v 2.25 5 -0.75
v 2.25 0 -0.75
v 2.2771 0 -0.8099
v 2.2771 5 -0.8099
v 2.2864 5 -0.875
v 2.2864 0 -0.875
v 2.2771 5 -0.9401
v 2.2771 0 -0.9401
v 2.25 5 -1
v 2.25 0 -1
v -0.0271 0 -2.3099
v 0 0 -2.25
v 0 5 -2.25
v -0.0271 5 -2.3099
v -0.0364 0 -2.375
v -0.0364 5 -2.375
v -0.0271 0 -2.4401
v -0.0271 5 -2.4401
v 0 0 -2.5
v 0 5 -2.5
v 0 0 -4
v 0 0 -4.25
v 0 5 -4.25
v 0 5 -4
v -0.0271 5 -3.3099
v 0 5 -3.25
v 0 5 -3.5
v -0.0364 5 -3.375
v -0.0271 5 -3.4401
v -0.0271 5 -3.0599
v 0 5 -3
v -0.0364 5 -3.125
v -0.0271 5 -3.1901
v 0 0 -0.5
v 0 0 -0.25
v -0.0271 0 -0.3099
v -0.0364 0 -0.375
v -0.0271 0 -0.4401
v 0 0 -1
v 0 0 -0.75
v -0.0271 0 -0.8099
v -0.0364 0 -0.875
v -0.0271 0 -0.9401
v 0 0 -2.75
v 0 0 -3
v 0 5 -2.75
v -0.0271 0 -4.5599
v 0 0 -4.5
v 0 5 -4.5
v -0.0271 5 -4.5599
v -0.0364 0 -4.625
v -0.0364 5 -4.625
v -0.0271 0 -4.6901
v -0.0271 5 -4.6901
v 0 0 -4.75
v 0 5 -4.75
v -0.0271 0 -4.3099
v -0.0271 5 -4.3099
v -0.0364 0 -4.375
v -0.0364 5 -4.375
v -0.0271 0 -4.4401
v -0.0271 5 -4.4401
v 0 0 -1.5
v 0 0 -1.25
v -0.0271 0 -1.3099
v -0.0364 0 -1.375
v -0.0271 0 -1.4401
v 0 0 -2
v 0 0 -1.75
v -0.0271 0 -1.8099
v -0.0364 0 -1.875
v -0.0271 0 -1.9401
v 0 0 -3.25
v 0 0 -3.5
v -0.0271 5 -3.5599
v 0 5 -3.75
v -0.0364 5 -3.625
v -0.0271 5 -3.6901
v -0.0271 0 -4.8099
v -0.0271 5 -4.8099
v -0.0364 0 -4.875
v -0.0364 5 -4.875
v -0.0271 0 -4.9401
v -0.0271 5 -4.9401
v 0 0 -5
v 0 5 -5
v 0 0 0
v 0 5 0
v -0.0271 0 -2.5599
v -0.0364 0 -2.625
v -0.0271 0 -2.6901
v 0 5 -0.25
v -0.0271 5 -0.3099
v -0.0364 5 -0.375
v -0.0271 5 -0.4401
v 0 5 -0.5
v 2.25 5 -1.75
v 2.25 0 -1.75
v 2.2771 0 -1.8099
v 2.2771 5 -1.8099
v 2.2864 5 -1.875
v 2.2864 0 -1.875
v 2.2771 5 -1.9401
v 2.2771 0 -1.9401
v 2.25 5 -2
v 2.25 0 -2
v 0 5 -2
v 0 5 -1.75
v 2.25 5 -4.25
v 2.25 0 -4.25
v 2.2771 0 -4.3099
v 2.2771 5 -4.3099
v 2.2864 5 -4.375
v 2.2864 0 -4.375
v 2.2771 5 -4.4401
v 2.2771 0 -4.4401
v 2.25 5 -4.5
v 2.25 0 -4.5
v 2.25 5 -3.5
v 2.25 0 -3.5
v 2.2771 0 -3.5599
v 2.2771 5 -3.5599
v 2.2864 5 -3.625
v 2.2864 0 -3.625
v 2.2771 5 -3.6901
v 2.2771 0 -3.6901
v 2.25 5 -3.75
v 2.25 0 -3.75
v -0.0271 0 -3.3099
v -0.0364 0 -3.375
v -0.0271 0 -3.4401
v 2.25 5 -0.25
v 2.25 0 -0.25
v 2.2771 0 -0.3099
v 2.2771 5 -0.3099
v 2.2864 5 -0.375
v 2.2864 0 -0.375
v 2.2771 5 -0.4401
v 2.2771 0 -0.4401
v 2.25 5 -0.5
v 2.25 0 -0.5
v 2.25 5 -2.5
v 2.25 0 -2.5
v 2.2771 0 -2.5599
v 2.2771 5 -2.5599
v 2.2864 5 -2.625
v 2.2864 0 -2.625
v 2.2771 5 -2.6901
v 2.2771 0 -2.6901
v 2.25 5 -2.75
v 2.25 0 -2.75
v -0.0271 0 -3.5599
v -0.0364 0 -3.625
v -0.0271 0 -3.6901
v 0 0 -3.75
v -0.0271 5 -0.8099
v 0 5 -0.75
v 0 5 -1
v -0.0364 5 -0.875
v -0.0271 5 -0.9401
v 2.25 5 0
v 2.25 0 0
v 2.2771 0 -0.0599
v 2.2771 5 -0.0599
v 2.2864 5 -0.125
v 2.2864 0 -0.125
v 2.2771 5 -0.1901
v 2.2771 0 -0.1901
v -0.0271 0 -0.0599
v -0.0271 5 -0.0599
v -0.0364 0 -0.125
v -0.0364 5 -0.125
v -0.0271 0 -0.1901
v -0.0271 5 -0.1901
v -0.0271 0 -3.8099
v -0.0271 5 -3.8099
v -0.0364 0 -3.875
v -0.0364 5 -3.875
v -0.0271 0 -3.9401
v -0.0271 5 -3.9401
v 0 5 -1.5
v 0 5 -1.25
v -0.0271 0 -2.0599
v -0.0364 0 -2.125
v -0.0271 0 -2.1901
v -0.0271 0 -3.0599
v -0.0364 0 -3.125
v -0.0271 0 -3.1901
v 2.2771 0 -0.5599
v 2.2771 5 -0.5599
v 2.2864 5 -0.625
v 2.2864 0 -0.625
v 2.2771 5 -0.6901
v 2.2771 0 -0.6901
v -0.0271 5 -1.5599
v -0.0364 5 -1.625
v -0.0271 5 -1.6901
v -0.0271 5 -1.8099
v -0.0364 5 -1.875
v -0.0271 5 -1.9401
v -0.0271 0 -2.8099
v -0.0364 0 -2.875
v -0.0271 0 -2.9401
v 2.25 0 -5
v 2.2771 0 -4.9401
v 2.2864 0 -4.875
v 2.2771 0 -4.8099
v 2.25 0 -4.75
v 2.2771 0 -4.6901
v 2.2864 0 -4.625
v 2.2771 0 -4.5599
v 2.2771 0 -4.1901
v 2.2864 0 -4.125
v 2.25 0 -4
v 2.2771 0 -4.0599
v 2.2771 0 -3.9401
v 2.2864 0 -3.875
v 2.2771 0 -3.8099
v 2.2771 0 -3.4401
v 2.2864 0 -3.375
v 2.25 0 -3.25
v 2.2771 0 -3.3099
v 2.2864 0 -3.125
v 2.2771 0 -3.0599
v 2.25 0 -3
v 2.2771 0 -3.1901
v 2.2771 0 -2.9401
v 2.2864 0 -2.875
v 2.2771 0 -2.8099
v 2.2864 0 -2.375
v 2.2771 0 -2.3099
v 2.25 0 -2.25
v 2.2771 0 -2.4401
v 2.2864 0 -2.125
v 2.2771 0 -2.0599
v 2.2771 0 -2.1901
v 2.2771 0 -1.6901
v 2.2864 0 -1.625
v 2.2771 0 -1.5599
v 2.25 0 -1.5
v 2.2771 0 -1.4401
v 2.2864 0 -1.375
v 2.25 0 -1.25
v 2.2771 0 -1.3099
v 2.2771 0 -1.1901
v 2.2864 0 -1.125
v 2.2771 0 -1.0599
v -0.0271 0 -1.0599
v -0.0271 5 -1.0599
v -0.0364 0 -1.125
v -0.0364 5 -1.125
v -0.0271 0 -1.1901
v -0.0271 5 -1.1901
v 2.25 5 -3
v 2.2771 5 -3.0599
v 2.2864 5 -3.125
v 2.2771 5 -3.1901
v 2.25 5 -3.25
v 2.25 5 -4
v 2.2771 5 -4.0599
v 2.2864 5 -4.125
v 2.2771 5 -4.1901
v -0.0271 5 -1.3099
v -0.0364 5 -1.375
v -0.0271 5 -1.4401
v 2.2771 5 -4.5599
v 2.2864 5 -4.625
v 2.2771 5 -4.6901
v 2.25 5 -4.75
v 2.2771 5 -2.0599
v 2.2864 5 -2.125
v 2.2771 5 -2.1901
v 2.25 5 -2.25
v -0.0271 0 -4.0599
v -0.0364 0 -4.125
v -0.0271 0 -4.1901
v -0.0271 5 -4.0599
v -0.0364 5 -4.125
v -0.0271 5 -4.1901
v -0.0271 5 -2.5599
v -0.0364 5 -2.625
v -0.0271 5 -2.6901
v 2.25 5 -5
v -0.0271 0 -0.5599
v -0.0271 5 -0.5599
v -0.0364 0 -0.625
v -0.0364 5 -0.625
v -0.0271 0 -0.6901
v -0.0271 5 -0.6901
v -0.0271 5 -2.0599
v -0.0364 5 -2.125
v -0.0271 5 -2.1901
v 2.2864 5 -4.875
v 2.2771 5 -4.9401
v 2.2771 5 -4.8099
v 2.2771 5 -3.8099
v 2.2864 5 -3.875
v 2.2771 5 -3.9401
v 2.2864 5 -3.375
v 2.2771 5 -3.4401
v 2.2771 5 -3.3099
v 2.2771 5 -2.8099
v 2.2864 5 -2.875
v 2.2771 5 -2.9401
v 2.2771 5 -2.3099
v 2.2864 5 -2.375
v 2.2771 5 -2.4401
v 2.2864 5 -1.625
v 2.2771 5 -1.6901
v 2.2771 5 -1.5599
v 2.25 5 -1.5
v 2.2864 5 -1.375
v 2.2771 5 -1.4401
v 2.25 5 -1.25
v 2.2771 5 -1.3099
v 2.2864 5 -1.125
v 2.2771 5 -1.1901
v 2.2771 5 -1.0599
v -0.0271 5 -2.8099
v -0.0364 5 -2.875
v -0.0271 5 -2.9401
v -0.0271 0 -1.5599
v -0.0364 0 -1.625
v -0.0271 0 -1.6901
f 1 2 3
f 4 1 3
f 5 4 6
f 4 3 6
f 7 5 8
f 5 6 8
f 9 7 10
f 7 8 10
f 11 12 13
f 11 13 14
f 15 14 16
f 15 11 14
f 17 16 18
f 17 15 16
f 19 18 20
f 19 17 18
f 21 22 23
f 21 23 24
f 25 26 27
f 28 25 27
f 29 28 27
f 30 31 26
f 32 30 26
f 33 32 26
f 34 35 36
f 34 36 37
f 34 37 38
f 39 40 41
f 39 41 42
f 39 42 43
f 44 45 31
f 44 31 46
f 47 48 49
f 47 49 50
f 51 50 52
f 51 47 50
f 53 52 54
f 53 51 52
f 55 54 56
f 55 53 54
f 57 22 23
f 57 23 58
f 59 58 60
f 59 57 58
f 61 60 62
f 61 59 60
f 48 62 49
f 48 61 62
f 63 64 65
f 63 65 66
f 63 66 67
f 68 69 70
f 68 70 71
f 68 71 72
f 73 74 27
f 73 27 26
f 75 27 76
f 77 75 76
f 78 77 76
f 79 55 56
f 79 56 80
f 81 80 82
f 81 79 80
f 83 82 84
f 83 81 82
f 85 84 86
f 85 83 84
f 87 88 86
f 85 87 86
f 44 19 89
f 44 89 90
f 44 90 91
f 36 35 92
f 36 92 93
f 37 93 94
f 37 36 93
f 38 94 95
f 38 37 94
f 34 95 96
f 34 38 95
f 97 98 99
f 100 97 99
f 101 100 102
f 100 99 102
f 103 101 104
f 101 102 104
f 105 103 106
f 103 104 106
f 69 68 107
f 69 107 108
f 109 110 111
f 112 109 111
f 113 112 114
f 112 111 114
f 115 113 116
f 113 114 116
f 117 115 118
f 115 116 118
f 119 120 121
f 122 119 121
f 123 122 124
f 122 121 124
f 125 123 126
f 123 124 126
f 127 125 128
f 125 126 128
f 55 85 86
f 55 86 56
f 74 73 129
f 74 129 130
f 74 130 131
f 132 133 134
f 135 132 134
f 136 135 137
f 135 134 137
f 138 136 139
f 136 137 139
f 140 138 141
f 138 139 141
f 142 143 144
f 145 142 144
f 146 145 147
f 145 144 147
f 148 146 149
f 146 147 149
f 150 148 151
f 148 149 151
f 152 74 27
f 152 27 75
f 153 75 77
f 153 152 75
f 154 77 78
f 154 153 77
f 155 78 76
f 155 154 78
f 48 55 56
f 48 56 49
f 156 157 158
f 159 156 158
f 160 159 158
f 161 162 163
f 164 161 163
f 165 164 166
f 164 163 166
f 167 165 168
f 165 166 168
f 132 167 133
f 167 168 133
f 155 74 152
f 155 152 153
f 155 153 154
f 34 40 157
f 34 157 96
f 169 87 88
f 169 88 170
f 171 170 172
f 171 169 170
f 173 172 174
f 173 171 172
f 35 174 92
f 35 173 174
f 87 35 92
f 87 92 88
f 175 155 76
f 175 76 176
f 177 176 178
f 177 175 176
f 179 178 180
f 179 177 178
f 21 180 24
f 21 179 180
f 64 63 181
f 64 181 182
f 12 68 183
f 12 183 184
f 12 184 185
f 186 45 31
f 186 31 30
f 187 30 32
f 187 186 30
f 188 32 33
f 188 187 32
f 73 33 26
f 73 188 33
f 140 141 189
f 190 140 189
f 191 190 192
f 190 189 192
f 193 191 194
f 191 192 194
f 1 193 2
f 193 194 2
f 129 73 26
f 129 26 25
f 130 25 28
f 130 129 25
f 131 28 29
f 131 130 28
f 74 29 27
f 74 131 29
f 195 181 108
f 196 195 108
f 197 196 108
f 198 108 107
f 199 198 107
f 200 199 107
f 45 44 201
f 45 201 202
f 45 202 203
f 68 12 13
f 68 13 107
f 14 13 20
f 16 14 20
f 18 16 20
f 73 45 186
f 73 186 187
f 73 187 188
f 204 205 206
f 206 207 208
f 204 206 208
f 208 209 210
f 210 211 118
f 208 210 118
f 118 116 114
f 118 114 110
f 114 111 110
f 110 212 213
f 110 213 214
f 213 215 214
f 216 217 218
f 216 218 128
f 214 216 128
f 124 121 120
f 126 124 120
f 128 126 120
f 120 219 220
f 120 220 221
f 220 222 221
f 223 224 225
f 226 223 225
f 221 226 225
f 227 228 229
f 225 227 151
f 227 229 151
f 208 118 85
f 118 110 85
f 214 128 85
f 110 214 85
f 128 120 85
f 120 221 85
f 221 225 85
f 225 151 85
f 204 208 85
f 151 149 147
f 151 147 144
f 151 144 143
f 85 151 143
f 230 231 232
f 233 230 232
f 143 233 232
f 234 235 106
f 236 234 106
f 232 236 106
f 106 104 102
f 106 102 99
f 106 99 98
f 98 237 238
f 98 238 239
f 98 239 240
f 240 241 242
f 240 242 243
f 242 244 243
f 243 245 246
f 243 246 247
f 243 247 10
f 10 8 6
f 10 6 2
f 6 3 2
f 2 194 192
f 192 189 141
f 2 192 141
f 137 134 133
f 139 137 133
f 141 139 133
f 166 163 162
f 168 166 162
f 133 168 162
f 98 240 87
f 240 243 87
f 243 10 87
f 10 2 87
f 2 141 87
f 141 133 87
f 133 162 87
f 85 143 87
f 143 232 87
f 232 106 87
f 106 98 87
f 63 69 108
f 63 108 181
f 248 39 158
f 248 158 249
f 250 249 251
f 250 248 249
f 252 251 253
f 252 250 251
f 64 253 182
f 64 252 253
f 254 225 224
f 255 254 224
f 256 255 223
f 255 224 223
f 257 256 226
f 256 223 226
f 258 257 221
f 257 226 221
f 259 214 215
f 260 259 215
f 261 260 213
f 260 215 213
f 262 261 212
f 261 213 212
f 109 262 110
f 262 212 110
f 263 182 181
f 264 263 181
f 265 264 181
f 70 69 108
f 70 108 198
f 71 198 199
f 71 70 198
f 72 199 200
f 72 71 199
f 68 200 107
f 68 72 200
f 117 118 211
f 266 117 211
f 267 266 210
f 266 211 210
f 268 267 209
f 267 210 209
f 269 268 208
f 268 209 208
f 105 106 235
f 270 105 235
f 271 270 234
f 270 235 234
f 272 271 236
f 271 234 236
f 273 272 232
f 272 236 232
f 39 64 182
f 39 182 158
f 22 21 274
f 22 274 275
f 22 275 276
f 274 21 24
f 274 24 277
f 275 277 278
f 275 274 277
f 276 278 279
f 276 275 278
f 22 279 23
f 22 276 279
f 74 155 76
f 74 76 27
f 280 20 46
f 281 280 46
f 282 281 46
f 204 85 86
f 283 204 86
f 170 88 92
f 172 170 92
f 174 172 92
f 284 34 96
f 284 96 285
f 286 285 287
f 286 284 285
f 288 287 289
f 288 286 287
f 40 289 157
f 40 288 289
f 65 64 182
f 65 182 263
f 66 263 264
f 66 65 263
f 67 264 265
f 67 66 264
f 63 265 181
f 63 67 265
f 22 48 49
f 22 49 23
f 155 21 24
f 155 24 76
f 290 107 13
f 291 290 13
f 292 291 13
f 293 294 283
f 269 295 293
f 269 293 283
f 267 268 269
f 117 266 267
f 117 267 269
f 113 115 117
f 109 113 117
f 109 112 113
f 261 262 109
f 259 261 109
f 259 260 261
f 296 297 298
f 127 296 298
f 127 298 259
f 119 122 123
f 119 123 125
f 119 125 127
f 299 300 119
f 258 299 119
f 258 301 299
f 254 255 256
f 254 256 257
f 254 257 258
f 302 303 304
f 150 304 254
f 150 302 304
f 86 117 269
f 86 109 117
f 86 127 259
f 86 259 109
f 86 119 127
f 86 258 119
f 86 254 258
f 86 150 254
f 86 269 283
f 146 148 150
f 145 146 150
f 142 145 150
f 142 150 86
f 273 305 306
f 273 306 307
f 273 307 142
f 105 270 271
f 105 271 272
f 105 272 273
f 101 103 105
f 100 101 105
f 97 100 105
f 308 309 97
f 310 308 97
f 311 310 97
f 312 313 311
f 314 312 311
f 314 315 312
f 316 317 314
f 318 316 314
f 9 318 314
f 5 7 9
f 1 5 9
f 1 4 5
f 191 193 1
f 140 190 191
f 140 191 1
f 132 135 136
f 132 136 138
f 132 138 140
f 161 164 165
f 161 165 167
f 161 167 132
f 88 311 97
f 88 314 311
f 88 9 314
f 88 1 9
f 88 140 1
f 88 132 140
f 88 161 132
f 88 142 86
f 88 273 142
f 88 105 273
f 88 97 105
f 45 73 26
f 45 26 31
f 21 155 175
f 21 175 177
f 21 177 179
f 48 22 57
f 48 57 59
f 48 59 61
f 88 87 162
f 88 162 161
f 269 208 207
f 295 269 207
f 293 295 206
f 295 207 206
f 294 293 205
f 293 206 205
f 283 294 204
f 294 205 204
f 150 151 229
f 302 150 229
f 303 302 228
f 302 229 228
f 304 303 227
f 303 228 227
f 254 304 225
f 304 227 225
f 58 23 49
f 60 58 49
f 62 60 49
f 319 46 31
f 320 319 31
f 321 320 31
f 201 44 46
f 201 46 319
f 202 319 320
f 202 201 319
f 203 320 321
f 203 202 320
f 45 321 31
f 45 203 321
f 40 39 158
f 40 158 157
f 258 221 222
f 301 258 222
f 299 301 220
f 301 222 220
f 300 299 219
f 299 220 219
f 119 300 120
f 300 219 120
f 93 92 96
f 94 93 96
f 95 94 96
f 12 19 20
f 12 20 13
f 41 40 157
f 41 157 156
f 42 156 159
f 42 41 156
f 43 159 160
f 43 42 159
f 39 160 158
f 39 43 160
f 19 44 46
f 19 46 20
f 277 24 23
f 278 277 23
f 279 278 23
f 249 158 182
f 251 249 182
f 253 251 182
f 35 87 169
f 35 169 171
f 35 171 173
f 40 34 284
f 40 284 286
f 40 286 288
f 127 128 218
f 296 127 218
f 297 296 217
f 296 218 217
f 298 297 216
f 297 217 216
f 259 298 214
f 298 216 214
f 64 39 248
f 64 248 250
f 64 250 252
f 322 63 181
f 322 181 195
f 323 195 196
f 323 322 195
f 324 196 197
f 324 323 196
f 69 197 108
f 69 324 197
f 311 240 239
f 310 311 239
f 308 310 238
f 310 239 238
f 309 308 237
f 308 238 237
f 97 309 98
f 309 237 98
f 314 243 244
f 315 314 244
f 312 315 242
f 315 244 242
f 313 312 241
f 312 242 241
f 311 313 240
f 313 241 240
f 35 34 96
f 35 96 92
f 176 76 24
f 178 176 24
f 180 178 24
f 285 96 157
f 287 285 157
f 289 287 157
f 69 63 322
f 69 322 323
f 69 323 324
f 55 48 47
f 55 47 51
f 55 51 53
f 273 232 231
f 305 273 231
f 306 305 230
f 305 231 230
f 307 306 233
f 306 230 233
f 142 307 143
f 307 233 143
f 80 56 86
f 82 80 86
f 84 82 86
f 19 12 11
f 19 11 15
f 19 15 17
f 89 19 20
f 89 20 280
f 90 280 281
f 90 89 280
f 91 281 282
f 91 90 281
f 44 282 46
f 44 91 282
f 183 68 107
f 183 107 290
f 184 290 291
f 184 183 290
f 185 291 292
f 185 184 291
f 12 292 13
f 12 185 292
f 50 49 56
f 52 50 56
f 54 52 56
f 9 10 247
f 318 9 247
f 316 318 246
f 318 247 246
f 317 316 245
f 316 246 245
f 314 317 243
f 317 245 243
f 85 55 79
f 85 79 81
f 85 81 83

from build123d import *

# Parameters (mm, degrees)
SKETCH_1_W         = 5
SKETCH_1_H         = 5
EXTRUDE_1_DEPTH    = 2.25
EXTRUDE_3_DEPTH    = 5
EXTRUDE_3_2_DEPTH  = 5
EXTRUDE_3_3_DEPTH  = 5
EXTRUDE_3_4_DEPTH  = 5
EXTRUDE_3_5_DEPTH  = 5
EXTRUDE_3_6_DEPTH  = 5
EXTRUDE_3_7_DEPTH  = 5
EXTRUDE_3_8_DEPTH  = 5
EXTRUDE_3_9_DEPTH  = 5
EXTRUDE_3_10_DEPTH = 5
EXTRUDE_3_11_DEPTH = 5
EXTRUDE_3_12_DEPTH = 5
EXTRUDE_3_13_DEPTH = 5
EXTRUDE_3_14_DEPTH = 5
EXTRUDE_3_15_DEPTH = 5
EXTRUDE_3_16_DEPTH = 5
EXTRUDE_3_17_DEPTH = 5
EXTRUDE_3_18_DEPTH = 5
EXTRUDE_3_19_DEPTH = 5
EXTRUDE_3_20_DEPTH = 5


with BuildPart() as part:
    # 草图1 → 凸台-拉伸1 (new body)
    with BuildSketch(Plane(origin=(0, 0, 0), x_dir=(0, 0, -1), z_dir=(1, 0, 0))):
        with Locations((2.5, 2.5)):
            Rectangle(SKETCH_1_W, SKETCH_1_H)
    extrude(amount=EXTRUDE_1_DEPTH)


with BuildPart() as body_2:
    # 草图3 → 凸台-拉伸3 (new body)
    with BuildSketch(Plane.XZ):
        with BuildLine():
            ThreePointArc((0, -4.75), (-0.03635585, -4.875), (0, -5))
            Line((0, -5), (0, -4.75))
        make_face()
    extrude_3 = extrude(amount=-EXTRUDE_3_DEPTH)


with BuildPart() as body_3:
    # 草图3 → Extrude 3 2 (new body)
    with BuildSketch(Plane.XZ):
        with BuildLine():
            ThreePointArc((0, -4.5), (-0.03635585, -4.625), (0, -4.75))
            Line((0, -4.75), (0, -4.5))
        make_face()
    extrude_3_2 = extrude(amount=-EXTRUDE_3_2_DEPTH)


with BuildPart() as body_4:
    # 草图3 → Extrude 3 3 (new body)
    with BuildSketch(Plane.XZ):
        with BuildLine():
            ThreePointArc((0, -4.25), (-0.03635585, -4.375), (0, -4.5))
            Line((0, -4.5), (0, -4.25))
        make_face()
    extrude_3_3 = extrude(amount=-EXTRUDE_3_3_DEPTH)


with BuildPart() as body_5:
    # 草图3 → Extrude 3 4 (new body)
    with BuildSketch(Plane.XZ):
        with BuildLine():
            ThreePointArc((0, -4), (-0.03635585, -4.125), (0, -4.25))
            Line((0, -4.25), (0, -4))
        make_face()
    extrude_3_4 = extrude(amount=-EXTRUDE_3_4_DEPTH)


with BuildPart() as body_6:
    # 草图3 → Extrude 3 5 (new body)
    with BuildSketch(Plane.XZ):
        with BuildLine():
            ThreePointArc((0, -3.75), (-0.03635585, -3.875), (0, -4))
            Line((0, -4), (0, -3.75))
        make_face()
    extrude_3_5 = extrude(amount=-EXTRUDE_3_5_DEPTH)


with BuildPart() as body_7:
    # 草图3 → Extrude 3 6 (new body)
    with BuildSketch(Plane.XZ):
        with BuildLine():
            ThreePointArc((0, -3.5), (-0.03635585, -3.625), (0, -3.75))
            Line((0, -3.75), (0, -3.5))
        make_face()
    extrude_3_6 = extrude(amount=-EXTRUDE_3_6_DEPTH)


with BuildPart() as body_8:
    # 草图3 → Extrude 3 7 (new body)
    with BuildSketch(Plane.XZ):
        with BuildLine():
            ThreePointArc((0, -3.25), (-0.03635585, -3.375), (0, -3.5))
            Line((0, -3.5), (0, -3.25))
        make_face()
    extrude_3_7 = extrude(amount=-EXTRUDE_3_7_DEPTH)


with BuildPart() as body_9:
    # 草图3 → Extrude 3 8 (new body)
    with BuildSketch(Plane.XZ):
        with BuildLine():
            ThreePointArc((0, -3), (-0.03635585, -3.125), (0, -3.25))
            Line((0, -3.25), (0, -3))
        make_face()
    extrude_3_8 = extrude(amount=-EXTRUDE_3_8_DEPTH)


with BuildPart() as body_10:
    # 草图3 → Extrude 3 9 (new body)
    with BuildSketch(Plane.XZ):
        with BuildLine():
            ThreePointArc((0, -2.75), (-0.03635585, -2.875), (0, -3))
            Line((0, -3), (0, -2.75))
        make_face()
    extrude_3_9 = extrude(amount=-EXTRUDE_3_9_DEPTH)


with BuildPart() as body_11:
    # 草图3 → Extrude 3 10 (new body)
    with BuildSketch(Plane.XZ):
        with BuildLine():
            ThreePointArc((0, -2.5), (-0.03635585, -2.625), (0, -2.75))
            Line((0, -2.75), (0, -2.5))
        make_face()
    extrude_3_10 = extrude(amount=-EXTRUDE_3_10_DEPTH)


with BuildPart() as body_12:
    # 草图3 → Extrude 3 11 (new body)
    with BuildSketch(Plane.XZ):
        with BuildLine():
            ThreePointArc((0, -2.25), (-0.03635585, -2.375), (0, -2.5))
            Line((0, -2.5), (0, -2.25))
        make_face()
    extrude_3_11 = extrude(amount=-EXTRUDE_3_11_DEPTH)


with BuildPart() as body_13:
    # 草图3 → Extrude 3 12 (new body)
    with BuildSketch(Plane.XZ):
        with BuildLine():
            ThreePointArc((0, -2), (-0.03635585, -2.125), (0, -2.25))
            Line((0, -2.25), (0, -2))
        make_face()
    extrude_3_12 = extrude(amount=-EXTRUDE_3_12_DEPTH)


with BuildPart() as body_14:
    # 草图3 → Extrude 3 13 (new body)
    with BuildSketch(Plane.XZ):
        with BuildLine():
            ThreePointArc((0, -1.75), (-0.03635585, -1.875), (0, -2))
            Line((0, -2), (0, -1.75))
        make_face()
    extrude_3_13 = extrude(amount=-EXTRUDE_3_13_DEPTH)


with BuildPart() as body_15:
    # 草图3 → Extrude 3 14 (new body)
    with BuildSketch(Plane.XZ):
        with BuildLine():
            ThreePointArc((0, -1.5), (-0.03635585, -1.625), (0, -1.75))
            Line((0, -1.75), (0, -1.5))
        make_face()
    extrude_3_14 = extrude(amount=-EXTRUDE_3_14_DEPTH)


with BuildPart() as body_16:
    # 草图3 → Extrude 3 15 (new body)
    with BuildSketch(Plane.XZ):
        with BuildLine():
            ThreePointArc((0, -1.25), (-0.03635585, -1.375), (0, -1.5))
            Line((0, -1.5), (0, -1.25))
        make_face()
    extrude_3_15 = extrude(amount=-EXTRUDE_3_15_DEPTH)


with BuildPart() as body_17:
    # 草图3 → Extrude 3 16 (new body)
    with BuildSketch(Plane.XZ):
        with BuildLine():
            ThreePointArc((0, -1), (-0.03635585, -1.125), (0, -1.25))
            Line((0, -1.25), (0, -1))
        make_face()
    extrude_3_16 = extrude(amount=-EXTRUDE_3_16_DEPTH)


with BuildPart() as body_18:
    # 草图3 → Extrude 3 17 (new body)
    with BuildSketch(Plane.XZ):
        with BuildLine():
            ThreePointArc((0, -0.75), (-0.03635585, -0.875), (0, -1))
            Line((0, -1), (0, -0.75))
        make_face()
    extrude_3_17 = extrude(amount=-EXTRUDE_3_17_DEPTH)


with BuildPart() as body_19:
    # 草图3 → Extrude 3 18 (new body)
    with BuildSketch(Plane.XZ):
        with BuildLine():
            ThreePointArc((0, -0.5), (-0.03635585, -0.625), (0, -0.75))
            Line((0, -0.75), (0, -0.5))
        make_face()
    extrude_3_18 = extrude(amount=-EXTRUDE_3_18_DEPTH)


with BuildPart() as body_20:
    # 草图3 → Extrude 3 19 (new body)
    with BuildSketch(Plane.XZ):
        with BuildLine():
            ThreePointArc((0, -0.25), (-0.03635585, -0.375), (0, -0.5))
            Line((0, -0.5), (0, -0.25))
        make_face()
    extrude_3_19 = extrude(amount=-EXTRUDE_3_19_DEPTH)


with BuildPart() as body_21:
    # 草图3 → Extrude 3 20 (new body)
    with BuildSketch(Plane.XZ):
        with BuildLine():
            ThreePointArc((0, 0), (-0.03635585, -0.125), (0, -0.25))
            Line((0, -0.25), (0, 0))
        make_face()
    extrude_3_20 = extrude(amount=-EXTRUDE_3_20_DEPTH)


with BuildPart() as part_1:
    add(part.part)

    # 镜向1: 凸台-拉伸3, Extrude 3 2, Extrude 3 3, Extrude 3 4, Extrude 3 5, Extrude 3 6, Extrude 3 7, Extrude 3 8, Extrude 3 9, Extrude 3 10, Extrude 3 11, Extrude 3 12, Extrude 3 13, Extrude 3 14, Extrude 3 15, Extrude 3 16, Extrude 3 17, Extrude 3 18, Extrude 3 19, Extrude 3 20 across plane
    add(extrude_3.mirror(Plane(origin=(1.125, 0, 0), x_dir=(0, 0, 1), z_dir=(1, 0, 0))))
    add(extrude_3_2.mirror(Plane(origin=(1.125, 0, 0), x_dir=(0, 0, 1), z_dir=(1, 0, 0))))
    add(extrude_3_3.mirror(Plane(origin=(1.125, 0, 0), x_dir=(0, 0, 1), z_dir=(1, 0, 0))))
    add(extrude_3_4.mirror(Plane(origin=(1.125, 0, 0), x_dir=(0, 0, 1), z_dir=(1, 0, 0))))
    add(extrude_3_5.mirror(Plane(origin=(1.125, 0, 0), x_dir=(0, 0, 1), z_dir=(1, 0, 0))))
    add(extrude_3_6.mirror(Plane(origin=(1.125, 0, 0), x_dir=(0, 0, 1), z_dir=(1, 0, 0))))
    add(extrude_3_7.mirror(Plane(origin=(1.125, 0, 0), x_dir=(0, 0, 1), z_dir=(1, 0, 0))))
    add(extrude_3_8.mirror(Plane(origin=(1.125, 0, 0), x_dir=(0, 0, 1), z_dir=(1, 0, 0))))
    add(extrude_3_9.mirror(Plane(origin=(1.125, 0, 0), x_dir=(0, 0, 1), z_dir=(1, 0, 0))))
    add(extrude_3_10.mirror(Plane(origin=(1.125, 0, 0), x_dir=(0, 0, 1), z_dir=(1, 0, 0))))
    add(extrude_3_11.mirror(Plane(origin=(1.125, 0, 0), x_dir=(0, 0, 1), z_dir=(1, 0, 0))))
    add(extrude_3_12.mirror(Plane(origin=(1.125, 0, 0), x_dir=(0, 0, 1), z_dir=(1, 0, 0))))
    add(extrude_3_13.mirror(Plane(origin=(1.125, 0, 0), x_dir=(0, 0, 1), z_dir=(1, 0, 0))))
    add(extrude_3_14.mirror(Plane(origin=(1.125, 0, 0), x_dir=(0, 0, 1), z_dir=(1, 0, 0))))
    add(extrude_3_15.mirror(Plane(origin=(1.125, 0, 0), x_dir=(0, 0, 1), z_dir=(1, 0, 0))))
    add(extrude_3_16.mirror(Plane(origin=(1.125, 0, 0), x_dir=(0, 0, 1), z_dir=(1, 0, 0))))
    add(extrude_3_17.mirror(Plane(origin=(1.125, 0, 0), x_dir=(0, 0, 1), z_dir=(1, 0, 0))))
    add(extrude_3_18.mirror(Plane(origin=(1.125, 0, 0), x_dir=(0, 0, 1), z_dir=(1, 0, 0))))
    add(extrude_3_19.mirror(Plane(origin=(1.125, 0, 0), x_dir=(0, 0, 1), z_dir=(1, 0, 0))))
    add(extrude_3_20.mirror(Plane(origin=(1.125, 0, 0), x_dir=(0, 0, 1), z_dir=(1, 0, 0))))


solid = Compound([body_2.part, body_3.part, body_4.part, body_5.part, body_6.part, body_7.part, body_8.part, body_9.part, body_10.part, body_11.part, body_12.part, body_13.part, body_14.part, body_15.part, body_16.part, body_17.part, body_18.part, body_19.part, body_20.part, body_21.part, part_1.part])
